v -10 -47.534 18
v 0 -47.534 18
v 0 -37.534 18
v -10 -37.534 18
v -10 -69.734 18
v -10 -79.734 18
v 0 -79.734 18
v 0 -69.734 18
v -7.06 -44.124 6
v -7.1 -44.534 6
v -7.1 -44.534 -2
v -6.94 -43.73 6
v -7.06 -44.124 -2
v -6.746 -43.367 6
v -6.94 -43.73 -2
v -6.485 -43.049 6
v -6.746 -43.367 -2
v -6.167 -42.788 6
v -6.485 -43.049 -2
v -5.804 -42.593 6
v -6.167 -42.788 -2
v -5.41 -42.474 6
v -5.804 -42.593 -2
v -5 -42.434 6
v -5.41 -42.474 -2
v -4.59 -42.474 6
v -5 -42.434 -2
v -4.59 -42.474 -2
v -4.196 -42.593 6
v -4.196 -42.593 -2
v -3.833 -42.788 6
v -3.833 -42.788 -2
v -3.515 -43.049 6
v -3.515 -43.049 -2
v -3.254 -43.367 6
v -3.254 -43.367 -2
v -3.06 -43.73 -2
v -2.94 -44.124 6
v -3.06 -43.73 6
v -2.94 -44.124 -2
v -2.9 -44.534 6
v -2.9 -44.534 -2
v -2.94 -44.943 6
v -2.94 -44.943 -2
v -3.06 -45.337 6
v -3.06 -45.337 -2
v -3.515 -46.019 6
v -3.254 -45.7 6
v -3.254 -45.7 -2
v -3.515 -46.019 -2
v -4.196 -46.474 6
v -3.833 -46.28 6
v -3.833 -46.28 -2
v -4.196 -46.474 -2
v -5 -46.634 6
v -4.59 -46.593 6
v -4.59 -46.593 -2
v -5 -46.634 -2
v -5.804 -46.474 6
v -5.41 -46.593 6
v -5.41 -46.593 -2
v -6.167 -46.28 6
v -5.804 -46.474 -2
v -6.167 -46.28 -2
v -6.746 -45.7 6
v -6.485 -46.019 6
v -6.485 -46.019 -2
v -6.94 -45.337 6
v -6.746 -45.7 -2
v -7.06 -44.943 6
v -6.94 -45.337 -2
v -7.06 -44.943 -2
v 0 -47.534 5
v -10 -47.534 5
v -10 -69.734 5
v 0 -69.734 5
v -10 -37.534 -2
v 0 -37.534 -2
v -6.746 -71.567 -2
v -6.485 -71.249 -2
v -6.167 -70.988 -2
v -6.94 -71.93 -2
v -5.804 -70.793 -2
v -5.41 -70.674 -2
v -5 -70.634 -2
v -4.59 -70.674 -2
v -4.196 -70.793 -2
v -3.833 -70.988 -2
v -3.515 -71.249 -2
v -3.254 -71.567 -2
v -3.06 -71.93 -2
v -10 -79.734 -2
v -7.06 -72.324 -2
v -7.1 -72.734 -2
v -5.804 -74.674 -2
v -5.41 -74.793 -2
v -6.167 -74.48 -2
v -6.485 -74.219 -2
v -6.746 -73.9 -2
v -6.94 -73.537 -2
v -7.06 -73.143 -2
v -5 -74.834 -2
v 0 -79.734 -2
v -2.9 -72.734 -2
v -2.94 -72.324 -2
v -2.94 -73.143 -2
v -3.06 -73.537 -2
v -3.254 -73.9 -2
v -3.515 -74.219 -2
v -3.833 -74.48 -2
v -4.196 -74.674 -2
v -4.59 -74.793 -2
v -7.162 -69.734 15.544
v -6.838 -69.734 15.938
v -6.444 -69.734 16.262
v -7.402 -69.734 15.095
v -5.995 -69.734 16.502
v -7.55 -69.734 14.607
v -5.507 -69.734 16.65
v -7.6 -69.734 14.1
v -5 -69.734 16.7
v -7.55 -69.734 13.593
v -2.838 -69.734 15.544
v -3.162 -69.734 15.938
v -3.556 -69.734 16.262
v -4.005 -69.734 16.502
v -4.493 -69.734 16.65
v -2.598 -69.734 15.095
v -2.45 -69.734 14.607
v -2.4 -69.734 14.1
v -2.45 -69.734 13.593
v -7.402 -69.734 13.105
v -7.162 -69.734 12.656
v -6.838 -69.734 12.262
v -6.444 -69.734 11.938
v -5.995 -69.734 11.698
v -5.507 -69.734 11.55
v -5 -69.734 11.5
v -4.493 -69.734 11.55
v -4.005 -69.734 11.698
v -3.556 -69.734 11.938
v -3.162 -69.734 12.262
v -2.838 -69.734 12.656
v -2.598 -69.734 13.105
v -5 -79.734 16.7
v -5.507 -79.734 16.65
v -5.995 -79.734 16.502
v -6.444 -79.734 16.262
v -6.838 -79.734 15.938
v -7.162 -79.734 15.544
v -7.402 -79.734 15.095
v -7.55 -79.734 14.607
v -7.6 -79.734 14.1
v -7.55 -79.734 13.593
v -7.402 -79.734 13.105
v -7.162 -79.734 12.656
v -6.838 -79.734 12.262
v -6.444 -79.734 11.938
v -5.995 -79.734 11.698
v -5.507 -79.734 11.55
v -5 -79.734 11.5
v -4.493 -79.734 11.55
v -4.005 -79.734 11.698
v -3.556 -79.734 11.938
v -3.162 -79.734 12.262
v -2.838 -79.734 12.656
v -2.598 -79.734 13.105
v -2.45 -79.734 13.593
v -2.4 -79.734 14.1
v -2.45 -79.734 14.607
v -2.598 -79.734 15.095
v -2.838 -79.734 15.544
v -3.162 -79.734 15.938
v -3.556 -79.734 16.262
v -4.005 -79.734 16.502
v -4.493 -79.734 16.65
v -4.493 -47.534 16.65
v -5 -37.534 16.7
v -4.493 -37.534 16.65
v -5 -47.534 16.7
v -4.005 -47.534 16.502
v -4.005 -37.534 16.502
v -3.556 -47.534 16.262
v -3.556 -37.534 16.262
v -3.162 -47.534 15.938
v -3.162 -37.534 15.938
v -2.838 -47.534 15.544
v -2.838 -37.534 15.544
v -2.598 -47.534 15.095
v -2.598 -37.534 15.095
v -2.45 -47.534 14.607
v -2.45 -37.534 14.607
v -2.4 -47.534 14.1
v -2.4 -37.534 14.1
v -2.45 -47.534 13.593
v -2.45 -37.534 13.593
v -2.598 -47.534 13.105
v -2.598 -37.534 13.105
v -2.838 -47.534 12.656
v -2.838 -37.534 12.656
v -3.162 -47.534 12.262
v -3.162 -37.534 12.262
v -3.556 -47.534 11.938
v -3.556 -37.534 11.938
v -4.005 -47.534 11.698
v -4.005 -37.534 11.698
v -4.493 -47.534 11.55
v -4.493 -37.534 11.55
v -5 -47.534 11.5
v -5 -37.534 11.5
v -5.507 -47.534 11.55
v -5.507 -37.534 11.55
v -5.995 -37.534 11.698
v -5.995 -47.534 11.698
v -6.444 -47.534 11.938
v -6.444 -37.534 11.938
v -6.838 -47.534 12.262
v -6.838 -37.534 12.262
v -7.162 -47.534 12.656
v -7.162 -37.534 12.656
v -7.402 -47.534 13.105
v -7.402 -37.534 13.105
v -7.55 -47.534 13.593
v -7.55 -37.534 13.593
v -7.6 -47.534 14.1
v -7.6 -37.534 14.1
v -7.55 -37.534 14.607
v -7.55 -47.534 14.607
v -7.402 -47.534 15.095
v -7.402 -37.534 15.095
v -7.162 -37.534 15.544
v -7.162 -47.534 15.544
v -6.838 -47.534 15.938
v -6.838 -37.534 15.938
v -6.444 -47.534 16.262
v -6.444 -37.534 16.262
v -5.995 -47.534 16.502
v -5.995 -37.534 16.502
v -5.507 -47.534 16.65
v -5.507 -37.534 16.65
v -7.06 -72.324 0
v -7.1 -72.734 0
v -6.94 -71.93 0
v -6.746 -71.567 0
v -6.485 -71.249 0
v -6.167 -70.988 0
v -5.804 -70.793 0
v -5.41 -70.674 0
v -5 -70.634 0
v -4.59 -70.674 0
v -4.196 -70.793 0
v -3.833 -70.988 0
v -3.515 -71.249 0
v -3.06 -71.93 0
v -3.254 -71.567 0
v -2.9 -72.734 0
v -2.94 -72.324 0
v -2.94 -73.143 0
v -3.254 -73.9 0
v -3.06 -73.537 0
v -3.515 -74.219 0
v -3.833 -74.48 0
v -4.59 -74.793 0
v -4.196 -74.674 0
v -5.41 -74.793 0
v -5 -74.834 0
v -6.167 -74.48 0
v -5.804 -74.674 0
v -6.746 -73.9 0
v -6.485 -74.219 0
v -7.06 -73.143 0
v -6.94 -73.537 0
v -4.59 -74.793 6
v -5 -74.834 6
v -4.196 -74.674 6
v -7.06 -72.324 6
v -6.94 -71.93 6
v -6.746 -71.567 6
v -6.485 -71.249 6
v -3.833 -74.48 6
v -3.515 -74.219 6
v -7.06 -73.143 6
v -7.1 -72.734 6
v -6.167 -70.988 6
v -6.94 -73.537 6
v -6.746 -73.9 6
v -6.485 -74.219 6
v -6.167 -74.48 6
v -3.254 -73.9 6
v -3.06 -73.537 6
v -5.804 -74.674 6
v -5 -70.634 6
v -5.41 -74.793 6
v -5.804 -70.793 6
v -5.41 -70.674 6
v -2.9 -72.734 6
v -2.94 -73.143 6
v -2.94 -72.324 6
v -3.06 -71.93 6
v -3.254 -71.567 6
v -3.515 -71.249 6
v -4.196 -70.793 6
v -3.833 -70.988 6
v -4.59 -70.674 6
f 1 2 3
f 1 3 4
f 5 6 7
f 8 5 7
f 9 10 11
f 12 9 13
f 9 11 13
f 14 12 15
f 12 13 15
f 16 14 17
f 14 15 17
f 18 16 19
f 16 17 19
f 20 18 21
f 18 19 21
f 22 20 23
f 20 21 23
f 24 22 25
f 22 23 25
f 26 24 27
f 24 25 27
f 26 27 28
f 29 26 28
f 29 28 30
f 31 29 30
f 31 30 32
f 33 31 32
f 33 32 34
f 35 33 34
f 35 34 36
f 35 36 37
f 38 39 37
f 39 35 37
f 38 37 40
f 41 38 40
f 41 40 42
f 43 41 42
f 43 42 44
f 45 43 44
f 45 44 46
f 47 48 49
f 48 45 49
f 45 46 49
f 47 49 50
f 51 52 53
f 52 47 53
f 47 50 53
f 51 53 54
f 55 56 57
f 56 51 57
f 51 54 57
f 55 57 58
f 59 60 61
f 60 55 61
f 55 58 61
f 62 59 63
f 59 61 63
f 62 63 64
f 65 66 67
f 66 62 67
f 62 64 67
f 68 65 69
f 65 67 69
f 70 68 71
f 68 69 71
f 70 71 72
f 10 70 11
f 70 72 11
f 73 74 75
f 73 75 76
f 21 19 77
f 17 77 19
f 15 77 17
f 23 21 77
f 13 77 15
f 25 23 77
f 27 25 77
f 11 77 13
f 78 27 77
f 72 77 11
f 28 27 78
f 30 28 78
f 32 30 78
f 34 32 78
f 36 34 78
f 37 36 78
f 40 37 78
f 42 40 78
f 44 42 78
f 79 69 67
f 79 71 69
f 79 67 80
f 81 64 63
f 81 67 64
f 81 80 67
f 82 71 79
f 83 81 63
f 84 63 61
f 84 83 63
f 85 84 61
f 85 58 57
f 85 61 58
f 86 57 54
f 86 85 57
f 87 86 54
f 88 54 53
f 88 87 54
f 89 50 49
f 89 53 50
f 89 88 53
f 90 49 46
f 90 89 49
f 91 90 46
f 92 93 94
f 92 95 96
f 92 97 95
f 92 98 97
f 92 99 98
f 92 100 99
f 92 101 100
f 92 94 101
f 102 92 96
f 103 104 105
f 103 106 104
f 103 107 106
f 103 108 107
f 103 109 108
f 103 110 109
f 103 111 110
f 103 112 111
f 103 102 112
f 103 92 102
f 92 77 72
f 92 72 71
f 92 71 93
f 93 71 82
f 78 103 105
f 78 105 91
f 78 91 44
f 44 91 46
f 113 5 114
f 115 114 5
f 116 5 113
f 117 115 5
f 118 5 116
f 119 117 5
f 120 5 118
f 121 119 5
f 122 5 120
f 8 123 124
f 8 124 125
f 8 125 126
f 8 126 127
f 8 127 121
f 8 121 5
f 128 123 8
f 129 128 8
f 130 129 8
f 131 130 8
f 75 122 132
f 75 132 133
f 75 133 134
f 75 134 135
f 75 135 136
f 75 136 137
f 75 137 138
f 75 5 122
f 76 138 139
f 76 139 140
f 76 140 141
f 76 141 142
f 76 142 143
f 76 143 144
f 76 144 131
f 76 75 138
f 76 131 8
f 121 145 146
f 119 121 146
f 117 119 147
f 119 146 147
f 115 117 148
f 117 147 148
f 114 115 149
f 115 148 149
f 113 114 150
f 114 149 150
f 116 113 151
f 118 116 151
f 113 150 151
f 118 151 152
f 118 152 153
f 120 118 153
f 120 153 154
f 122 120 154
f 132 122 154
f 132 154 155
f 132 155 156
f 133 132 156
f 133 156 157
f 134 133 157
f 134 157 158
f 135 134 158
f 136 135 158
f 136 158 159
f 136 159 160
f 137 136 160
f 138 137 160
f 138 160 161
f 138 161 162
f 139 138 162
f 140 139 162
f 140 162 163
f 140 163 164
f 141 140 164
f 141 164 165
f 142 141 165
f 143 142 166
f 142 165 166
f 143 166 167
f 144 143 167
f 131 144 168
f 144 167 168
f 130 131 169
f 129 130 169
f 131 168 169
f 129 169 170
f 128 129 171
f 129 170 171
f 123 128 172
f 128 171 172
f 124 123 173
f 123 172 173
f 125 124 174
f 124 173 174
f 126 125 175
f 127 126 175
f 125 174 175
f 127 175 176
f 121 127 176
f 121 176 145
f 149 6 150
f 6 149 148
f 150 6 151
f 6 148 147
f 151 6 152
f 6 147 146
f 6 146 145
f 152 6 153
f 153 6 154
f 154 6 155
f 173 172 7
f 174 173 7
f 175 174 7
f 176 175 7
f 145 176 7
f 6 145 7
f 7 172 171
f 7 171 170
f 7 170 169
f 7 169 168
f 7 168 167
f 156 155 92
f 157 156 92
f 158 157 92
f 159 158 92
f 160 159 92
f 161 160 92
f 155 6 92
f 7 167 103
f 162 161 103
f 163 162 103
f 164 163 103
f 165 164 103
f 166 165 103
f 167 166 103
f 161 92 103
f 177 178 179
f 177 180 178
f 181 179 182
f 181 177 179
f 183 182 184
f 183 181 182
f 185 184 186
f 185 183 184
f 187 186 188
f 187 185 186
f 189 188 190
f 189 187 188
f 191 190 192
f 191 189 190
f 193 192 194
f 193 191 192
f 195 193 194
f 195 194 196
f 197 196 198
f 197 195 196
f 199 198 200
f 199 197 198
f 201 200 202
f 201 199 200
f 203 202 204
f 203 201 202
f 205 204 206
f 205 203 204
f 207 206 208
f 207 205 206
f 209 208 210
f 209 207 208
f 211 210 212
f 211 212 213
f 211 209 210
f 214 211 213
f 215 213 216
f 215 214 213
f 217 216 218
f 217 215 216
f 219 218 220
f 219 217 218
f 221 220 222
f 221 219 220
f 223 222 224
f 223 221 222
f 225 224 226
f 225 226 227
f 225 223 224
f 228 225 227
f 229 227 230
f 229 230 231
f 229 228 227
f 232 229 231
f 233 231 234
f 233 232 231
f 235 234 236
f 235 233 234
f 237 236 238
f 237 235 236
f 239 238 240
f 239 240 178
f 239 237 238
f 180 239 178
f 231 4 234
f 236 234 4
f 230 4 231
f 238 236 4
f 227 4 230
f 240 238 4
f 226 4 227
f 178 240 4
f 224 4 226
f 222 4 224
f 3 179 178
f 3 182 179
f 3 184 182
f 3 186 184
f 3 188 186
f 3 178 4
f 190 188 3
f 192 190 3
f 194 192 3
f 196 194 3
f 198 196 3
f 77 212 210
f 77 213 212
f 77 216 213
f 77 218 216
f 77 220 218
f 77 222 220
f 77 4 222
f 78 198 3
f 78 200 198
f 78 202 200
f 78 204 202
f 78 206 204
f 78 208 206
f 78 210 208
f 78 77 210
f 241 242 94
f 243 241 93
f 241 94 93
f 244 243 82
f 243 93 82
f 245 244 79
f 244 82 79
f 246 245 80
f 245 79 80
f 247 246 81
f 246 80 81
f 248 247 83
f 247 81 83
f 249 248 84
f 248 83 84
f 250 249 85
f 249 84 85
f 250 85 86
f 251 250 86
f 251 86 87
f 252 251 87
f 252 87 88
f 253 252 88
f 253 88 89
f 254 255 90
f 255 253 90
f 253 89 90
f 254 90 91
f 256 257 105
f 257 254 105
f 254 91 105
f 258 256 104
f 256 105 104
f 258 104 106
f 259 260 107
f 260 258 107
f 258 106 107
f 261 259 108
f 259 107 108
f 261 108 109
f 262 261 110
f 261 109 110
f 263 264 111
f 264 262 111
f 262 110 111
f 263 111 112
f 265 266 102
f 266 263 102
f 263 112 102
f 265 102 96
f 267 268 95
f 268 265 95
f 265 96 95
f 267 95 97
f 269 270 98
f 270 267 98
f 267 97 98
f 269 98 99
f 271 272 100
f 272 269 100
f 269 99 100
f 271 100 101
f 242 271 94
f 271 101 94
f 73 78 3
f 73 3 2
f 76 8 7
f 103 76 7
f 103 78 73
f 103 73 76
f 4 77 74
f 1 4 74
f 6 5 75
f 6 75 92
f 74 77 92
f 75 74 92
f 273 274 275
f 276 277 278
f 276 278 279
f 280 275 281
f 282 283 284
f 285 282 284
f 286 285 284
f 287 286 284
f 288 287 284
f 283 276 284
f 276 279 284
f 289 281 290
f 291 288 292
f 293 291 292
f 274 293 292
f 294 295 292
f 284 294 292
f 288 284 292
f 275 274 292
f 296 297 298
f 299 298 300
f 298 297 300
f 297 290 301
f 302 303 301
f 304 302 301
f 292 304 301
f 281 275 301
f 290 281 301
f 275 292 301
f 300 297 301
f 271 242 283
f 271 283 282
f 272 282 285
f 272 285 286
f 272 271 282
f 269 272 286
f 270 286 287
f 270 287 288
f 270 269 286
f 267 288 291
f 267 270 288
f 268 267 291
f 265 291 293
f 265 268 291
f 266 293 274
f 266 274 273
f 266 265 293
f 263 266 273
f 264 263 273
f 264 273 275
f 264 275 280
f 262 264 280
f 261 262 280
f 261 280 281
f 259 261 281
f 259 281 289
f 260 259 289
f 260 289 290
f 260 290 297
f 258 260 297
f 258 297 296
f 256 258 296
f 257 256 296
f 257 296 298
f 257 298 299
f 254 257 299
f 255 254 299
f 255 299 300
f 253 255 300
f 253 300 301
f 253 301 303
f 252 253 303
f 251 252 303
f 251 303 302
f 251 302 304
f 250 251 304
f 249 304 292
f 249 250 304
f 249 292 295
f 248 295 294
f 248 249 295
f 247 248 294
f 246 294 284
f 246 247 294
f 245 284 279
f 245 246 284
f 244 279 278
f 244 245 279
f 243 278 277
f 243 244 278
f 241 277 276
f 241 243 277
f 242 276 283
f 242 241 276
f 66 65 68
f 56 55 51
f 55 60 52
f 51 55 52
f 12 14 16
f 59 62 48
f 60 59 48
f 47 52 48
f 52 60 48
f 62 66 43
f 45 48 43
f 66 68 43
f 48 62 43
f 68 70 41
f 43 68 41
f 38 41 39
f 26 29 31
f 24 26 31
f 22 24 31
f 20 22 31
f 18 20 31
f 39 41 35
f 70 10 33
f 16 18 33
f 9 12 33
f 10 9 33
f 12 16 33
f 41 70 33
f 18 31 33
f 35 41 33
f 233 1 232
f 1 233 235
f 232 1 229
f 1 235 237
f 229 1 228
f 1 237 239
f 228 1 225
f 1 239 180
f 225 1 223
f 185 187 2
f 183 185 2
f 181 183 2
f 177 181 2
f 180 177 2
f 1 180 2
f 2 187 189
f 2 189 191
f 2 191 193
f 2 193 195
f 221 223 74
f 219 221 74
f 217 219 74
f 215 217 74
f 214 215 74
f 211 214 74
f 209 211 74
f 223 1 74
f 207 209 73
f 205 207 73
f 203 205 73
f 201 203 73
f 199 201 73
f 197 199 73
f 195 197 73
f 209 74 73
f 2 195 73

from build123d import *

# Parameters (mm, degrees)
SKETCH1_W           = 34.2
SKETCH1_H           = 10
SKETCH1_R           = 2.1
BOSS_EXTRUDE1_DEPTH = 3
SKETCH2_W           = 10
SKETCH2_H           = 6
SKETCH2_R           = 2.1
BOSS_EXTRUDE2_DEPTH = 3
SKETCH4_W           = 10
SKETCH4_H           = 6
BOSS_EXTRUDE3_DEPTH = 12
SKETCH5_R           = 2.6
CUT_EXTRUDE1_DEPTH  = 45
SKETCH6_W           = 10
SKETCH6_H           = 22.2
BOSS_EXTRUDE4_DEPTH = 2
BOSS_EXTRUDE5_START = 4
SKETCH7_W           = 10
SKETCH7_H           = 18
SKETCH7_R           = 2.6
BOSS_EXTRUDE5_DEPTH = 4
SKETCH8_W           = 10
SKETCH8_H           = 18
SKETCH8_R           = 2.6
BOSS_EXTRUDE6_DEPTH = 4
BOSS_EXTRUDE7_START = 2
SKETCH10_W          = 10
SKETCH10_H          = 42.2
SKETCH10_R          = 2.1
BOSS_EXTRUDE7_DEPTH = 2


with BuildPart() as part:
    # Sketch1 → Boss-Extrude1 (new body)
    with BuildSketch(Plane(origin=(0, 0, 0), x_dir=(0, 1, 0), z_dir=(0, 0, 1))):
        with Locations((-58.633609256, 5)):
            Rectangle(SKETCH1_W, SKETCH1_H)
        with Locations(Location((-72.733609256, 5, 0), (0, 0, 90))):
            Circle(SKETCH1_R, mode=Mode.SUBTRACT)
        with Locations(Location((-44.533609256, 5, 0), (0, 0, 90))):
            Circle(SKETCH1_R, mode=Mode.SUBTRACT)
    extrude(amount=BOSS_EXTRUDE1_DEPTH)

    # Sketch2 → Boss-Extrude2 (add)
    # profile 1 of 2: a face of its own
    with BuildSketch(Plane.XY.offset(3)):
        with Locations((-5, -44.533609256)):
            Rectangle(SKETCH2_W, SKETCH2_H)
        with Locations(Location((-5, -44.533609256, 0), (0, 0, 180))):
            Circle(SKETCH2_R, mode=Mode.SUBTRACT)
    # profile 2 of 2: a face of its own
    with BuildSketch(Plane.XY.offset(3)):
        with Locations((-5, -72.733609256)):
            Rectangle(SKETCH2_W, SKETCH2_H)
        with Locations(Location((-5, -72.733609256, 0), (0, 0, 180))):
            Circle(SKETCH2_R, mode=Mode.SUBTRACT)
    extrude(amount=BOSS_EXTRUDE2_DEPTH)

    # Sketch4 → Boss-Extrude3 (add)
    with BuildSketch(Plane.XY.offset(6)):
        with Locations((-5, -44.533609256)):
            Rectangle(SKETCH4_W, SKETCH4_H)
        with Locations((-5, -72.733609256)):
            Rectangle(SKETCH4_W, SKETCH4_H)
    extrude(amount=BOSS_EXTRUDE3_DEPTH)

    # Sketch5 → Cut-Extrude1 (cut)
    with BuildSketch(Plane.XZ.offset(75.733609256)):
        with Locations(Location((-5, 14.1, 0), (0, 0, 90))):
            Circle(SKETCH5_R)
    extrude(amount=-CUT_EXTRUDE1_DEPTH, mode=Mode.SUBTRACT)

    # Sketch6 → Boss-Extrude4 (add)
    with BuildSketch(Plane.XY.offset(3)):
        with Locations((-5, -58.633609256)):
            Rectangle(SKETCH6_W, SKETCH6_H)
    extrude(amount=BOSS_EXTRUDE4_DEPTH)

    # Sketch7 → Boss-Extrude5 (add)
    with BuildSketch(Plane.XZ.offset(75.733609256).offset(BOSS_EXTRUDE5_START)):
        with Locations((-5, 9)):
            Rectangle(SKETCH7_W, SKETCH7_H)
        with Locations(Location((-5, 14.1, 0), (0, 0, 90))):
            Circle(SKETCH7_R, mode=Mode.SUBTRACT)
    extrude(amount=-BOSS_EXTRUDE5_DEPTH)

    # Sketch8 → Boss-Extrude6 (add)
    with BuildSketch(Plane(origin=(0, -41.533609256, 0), x_dir=(-1, 0, 0), z_dir=(0, 1, 0))):
        with Locations((5, 9)):
            Rectangle(SKETCH8_W, SKETCH8_H)
        with Locations(Location((5, 14.1, 0), (0, 0, 90))):
            Circle(SKETCH8_R, mode=Mode.SUBTRACT)
    extrude(amount=BOSS_EXTRUDE6_DEPTH)

    # Sketch10 → Boss-Extrude7 (add)
    with BuildSketch(Plane(origin=(0, 0, 0), x_dir=(1, 0, 0), z_dir=(0, 0, -1)).offset(BOSS_EXTRUDE7_START)):
        with Locations((-5, 58.633609256)):
            Rectangle(SKETCH10_W, SKETCH10_H)
        with Locations(Location((-5, 72.733609256, 0), (0, 0, 180))):
            Circle(SKETCH10_R, mode=Mode.SUBTRACT)
        with Locations(Location((-5, 44.533609256, 0), (0, 0, 180))):
            Circle(SKETCH10_R, mode=Mode.SUBTRACT)
    extrude(amount=-BOSS_EXTRUDE7_DEPTH)


solid = part.part
